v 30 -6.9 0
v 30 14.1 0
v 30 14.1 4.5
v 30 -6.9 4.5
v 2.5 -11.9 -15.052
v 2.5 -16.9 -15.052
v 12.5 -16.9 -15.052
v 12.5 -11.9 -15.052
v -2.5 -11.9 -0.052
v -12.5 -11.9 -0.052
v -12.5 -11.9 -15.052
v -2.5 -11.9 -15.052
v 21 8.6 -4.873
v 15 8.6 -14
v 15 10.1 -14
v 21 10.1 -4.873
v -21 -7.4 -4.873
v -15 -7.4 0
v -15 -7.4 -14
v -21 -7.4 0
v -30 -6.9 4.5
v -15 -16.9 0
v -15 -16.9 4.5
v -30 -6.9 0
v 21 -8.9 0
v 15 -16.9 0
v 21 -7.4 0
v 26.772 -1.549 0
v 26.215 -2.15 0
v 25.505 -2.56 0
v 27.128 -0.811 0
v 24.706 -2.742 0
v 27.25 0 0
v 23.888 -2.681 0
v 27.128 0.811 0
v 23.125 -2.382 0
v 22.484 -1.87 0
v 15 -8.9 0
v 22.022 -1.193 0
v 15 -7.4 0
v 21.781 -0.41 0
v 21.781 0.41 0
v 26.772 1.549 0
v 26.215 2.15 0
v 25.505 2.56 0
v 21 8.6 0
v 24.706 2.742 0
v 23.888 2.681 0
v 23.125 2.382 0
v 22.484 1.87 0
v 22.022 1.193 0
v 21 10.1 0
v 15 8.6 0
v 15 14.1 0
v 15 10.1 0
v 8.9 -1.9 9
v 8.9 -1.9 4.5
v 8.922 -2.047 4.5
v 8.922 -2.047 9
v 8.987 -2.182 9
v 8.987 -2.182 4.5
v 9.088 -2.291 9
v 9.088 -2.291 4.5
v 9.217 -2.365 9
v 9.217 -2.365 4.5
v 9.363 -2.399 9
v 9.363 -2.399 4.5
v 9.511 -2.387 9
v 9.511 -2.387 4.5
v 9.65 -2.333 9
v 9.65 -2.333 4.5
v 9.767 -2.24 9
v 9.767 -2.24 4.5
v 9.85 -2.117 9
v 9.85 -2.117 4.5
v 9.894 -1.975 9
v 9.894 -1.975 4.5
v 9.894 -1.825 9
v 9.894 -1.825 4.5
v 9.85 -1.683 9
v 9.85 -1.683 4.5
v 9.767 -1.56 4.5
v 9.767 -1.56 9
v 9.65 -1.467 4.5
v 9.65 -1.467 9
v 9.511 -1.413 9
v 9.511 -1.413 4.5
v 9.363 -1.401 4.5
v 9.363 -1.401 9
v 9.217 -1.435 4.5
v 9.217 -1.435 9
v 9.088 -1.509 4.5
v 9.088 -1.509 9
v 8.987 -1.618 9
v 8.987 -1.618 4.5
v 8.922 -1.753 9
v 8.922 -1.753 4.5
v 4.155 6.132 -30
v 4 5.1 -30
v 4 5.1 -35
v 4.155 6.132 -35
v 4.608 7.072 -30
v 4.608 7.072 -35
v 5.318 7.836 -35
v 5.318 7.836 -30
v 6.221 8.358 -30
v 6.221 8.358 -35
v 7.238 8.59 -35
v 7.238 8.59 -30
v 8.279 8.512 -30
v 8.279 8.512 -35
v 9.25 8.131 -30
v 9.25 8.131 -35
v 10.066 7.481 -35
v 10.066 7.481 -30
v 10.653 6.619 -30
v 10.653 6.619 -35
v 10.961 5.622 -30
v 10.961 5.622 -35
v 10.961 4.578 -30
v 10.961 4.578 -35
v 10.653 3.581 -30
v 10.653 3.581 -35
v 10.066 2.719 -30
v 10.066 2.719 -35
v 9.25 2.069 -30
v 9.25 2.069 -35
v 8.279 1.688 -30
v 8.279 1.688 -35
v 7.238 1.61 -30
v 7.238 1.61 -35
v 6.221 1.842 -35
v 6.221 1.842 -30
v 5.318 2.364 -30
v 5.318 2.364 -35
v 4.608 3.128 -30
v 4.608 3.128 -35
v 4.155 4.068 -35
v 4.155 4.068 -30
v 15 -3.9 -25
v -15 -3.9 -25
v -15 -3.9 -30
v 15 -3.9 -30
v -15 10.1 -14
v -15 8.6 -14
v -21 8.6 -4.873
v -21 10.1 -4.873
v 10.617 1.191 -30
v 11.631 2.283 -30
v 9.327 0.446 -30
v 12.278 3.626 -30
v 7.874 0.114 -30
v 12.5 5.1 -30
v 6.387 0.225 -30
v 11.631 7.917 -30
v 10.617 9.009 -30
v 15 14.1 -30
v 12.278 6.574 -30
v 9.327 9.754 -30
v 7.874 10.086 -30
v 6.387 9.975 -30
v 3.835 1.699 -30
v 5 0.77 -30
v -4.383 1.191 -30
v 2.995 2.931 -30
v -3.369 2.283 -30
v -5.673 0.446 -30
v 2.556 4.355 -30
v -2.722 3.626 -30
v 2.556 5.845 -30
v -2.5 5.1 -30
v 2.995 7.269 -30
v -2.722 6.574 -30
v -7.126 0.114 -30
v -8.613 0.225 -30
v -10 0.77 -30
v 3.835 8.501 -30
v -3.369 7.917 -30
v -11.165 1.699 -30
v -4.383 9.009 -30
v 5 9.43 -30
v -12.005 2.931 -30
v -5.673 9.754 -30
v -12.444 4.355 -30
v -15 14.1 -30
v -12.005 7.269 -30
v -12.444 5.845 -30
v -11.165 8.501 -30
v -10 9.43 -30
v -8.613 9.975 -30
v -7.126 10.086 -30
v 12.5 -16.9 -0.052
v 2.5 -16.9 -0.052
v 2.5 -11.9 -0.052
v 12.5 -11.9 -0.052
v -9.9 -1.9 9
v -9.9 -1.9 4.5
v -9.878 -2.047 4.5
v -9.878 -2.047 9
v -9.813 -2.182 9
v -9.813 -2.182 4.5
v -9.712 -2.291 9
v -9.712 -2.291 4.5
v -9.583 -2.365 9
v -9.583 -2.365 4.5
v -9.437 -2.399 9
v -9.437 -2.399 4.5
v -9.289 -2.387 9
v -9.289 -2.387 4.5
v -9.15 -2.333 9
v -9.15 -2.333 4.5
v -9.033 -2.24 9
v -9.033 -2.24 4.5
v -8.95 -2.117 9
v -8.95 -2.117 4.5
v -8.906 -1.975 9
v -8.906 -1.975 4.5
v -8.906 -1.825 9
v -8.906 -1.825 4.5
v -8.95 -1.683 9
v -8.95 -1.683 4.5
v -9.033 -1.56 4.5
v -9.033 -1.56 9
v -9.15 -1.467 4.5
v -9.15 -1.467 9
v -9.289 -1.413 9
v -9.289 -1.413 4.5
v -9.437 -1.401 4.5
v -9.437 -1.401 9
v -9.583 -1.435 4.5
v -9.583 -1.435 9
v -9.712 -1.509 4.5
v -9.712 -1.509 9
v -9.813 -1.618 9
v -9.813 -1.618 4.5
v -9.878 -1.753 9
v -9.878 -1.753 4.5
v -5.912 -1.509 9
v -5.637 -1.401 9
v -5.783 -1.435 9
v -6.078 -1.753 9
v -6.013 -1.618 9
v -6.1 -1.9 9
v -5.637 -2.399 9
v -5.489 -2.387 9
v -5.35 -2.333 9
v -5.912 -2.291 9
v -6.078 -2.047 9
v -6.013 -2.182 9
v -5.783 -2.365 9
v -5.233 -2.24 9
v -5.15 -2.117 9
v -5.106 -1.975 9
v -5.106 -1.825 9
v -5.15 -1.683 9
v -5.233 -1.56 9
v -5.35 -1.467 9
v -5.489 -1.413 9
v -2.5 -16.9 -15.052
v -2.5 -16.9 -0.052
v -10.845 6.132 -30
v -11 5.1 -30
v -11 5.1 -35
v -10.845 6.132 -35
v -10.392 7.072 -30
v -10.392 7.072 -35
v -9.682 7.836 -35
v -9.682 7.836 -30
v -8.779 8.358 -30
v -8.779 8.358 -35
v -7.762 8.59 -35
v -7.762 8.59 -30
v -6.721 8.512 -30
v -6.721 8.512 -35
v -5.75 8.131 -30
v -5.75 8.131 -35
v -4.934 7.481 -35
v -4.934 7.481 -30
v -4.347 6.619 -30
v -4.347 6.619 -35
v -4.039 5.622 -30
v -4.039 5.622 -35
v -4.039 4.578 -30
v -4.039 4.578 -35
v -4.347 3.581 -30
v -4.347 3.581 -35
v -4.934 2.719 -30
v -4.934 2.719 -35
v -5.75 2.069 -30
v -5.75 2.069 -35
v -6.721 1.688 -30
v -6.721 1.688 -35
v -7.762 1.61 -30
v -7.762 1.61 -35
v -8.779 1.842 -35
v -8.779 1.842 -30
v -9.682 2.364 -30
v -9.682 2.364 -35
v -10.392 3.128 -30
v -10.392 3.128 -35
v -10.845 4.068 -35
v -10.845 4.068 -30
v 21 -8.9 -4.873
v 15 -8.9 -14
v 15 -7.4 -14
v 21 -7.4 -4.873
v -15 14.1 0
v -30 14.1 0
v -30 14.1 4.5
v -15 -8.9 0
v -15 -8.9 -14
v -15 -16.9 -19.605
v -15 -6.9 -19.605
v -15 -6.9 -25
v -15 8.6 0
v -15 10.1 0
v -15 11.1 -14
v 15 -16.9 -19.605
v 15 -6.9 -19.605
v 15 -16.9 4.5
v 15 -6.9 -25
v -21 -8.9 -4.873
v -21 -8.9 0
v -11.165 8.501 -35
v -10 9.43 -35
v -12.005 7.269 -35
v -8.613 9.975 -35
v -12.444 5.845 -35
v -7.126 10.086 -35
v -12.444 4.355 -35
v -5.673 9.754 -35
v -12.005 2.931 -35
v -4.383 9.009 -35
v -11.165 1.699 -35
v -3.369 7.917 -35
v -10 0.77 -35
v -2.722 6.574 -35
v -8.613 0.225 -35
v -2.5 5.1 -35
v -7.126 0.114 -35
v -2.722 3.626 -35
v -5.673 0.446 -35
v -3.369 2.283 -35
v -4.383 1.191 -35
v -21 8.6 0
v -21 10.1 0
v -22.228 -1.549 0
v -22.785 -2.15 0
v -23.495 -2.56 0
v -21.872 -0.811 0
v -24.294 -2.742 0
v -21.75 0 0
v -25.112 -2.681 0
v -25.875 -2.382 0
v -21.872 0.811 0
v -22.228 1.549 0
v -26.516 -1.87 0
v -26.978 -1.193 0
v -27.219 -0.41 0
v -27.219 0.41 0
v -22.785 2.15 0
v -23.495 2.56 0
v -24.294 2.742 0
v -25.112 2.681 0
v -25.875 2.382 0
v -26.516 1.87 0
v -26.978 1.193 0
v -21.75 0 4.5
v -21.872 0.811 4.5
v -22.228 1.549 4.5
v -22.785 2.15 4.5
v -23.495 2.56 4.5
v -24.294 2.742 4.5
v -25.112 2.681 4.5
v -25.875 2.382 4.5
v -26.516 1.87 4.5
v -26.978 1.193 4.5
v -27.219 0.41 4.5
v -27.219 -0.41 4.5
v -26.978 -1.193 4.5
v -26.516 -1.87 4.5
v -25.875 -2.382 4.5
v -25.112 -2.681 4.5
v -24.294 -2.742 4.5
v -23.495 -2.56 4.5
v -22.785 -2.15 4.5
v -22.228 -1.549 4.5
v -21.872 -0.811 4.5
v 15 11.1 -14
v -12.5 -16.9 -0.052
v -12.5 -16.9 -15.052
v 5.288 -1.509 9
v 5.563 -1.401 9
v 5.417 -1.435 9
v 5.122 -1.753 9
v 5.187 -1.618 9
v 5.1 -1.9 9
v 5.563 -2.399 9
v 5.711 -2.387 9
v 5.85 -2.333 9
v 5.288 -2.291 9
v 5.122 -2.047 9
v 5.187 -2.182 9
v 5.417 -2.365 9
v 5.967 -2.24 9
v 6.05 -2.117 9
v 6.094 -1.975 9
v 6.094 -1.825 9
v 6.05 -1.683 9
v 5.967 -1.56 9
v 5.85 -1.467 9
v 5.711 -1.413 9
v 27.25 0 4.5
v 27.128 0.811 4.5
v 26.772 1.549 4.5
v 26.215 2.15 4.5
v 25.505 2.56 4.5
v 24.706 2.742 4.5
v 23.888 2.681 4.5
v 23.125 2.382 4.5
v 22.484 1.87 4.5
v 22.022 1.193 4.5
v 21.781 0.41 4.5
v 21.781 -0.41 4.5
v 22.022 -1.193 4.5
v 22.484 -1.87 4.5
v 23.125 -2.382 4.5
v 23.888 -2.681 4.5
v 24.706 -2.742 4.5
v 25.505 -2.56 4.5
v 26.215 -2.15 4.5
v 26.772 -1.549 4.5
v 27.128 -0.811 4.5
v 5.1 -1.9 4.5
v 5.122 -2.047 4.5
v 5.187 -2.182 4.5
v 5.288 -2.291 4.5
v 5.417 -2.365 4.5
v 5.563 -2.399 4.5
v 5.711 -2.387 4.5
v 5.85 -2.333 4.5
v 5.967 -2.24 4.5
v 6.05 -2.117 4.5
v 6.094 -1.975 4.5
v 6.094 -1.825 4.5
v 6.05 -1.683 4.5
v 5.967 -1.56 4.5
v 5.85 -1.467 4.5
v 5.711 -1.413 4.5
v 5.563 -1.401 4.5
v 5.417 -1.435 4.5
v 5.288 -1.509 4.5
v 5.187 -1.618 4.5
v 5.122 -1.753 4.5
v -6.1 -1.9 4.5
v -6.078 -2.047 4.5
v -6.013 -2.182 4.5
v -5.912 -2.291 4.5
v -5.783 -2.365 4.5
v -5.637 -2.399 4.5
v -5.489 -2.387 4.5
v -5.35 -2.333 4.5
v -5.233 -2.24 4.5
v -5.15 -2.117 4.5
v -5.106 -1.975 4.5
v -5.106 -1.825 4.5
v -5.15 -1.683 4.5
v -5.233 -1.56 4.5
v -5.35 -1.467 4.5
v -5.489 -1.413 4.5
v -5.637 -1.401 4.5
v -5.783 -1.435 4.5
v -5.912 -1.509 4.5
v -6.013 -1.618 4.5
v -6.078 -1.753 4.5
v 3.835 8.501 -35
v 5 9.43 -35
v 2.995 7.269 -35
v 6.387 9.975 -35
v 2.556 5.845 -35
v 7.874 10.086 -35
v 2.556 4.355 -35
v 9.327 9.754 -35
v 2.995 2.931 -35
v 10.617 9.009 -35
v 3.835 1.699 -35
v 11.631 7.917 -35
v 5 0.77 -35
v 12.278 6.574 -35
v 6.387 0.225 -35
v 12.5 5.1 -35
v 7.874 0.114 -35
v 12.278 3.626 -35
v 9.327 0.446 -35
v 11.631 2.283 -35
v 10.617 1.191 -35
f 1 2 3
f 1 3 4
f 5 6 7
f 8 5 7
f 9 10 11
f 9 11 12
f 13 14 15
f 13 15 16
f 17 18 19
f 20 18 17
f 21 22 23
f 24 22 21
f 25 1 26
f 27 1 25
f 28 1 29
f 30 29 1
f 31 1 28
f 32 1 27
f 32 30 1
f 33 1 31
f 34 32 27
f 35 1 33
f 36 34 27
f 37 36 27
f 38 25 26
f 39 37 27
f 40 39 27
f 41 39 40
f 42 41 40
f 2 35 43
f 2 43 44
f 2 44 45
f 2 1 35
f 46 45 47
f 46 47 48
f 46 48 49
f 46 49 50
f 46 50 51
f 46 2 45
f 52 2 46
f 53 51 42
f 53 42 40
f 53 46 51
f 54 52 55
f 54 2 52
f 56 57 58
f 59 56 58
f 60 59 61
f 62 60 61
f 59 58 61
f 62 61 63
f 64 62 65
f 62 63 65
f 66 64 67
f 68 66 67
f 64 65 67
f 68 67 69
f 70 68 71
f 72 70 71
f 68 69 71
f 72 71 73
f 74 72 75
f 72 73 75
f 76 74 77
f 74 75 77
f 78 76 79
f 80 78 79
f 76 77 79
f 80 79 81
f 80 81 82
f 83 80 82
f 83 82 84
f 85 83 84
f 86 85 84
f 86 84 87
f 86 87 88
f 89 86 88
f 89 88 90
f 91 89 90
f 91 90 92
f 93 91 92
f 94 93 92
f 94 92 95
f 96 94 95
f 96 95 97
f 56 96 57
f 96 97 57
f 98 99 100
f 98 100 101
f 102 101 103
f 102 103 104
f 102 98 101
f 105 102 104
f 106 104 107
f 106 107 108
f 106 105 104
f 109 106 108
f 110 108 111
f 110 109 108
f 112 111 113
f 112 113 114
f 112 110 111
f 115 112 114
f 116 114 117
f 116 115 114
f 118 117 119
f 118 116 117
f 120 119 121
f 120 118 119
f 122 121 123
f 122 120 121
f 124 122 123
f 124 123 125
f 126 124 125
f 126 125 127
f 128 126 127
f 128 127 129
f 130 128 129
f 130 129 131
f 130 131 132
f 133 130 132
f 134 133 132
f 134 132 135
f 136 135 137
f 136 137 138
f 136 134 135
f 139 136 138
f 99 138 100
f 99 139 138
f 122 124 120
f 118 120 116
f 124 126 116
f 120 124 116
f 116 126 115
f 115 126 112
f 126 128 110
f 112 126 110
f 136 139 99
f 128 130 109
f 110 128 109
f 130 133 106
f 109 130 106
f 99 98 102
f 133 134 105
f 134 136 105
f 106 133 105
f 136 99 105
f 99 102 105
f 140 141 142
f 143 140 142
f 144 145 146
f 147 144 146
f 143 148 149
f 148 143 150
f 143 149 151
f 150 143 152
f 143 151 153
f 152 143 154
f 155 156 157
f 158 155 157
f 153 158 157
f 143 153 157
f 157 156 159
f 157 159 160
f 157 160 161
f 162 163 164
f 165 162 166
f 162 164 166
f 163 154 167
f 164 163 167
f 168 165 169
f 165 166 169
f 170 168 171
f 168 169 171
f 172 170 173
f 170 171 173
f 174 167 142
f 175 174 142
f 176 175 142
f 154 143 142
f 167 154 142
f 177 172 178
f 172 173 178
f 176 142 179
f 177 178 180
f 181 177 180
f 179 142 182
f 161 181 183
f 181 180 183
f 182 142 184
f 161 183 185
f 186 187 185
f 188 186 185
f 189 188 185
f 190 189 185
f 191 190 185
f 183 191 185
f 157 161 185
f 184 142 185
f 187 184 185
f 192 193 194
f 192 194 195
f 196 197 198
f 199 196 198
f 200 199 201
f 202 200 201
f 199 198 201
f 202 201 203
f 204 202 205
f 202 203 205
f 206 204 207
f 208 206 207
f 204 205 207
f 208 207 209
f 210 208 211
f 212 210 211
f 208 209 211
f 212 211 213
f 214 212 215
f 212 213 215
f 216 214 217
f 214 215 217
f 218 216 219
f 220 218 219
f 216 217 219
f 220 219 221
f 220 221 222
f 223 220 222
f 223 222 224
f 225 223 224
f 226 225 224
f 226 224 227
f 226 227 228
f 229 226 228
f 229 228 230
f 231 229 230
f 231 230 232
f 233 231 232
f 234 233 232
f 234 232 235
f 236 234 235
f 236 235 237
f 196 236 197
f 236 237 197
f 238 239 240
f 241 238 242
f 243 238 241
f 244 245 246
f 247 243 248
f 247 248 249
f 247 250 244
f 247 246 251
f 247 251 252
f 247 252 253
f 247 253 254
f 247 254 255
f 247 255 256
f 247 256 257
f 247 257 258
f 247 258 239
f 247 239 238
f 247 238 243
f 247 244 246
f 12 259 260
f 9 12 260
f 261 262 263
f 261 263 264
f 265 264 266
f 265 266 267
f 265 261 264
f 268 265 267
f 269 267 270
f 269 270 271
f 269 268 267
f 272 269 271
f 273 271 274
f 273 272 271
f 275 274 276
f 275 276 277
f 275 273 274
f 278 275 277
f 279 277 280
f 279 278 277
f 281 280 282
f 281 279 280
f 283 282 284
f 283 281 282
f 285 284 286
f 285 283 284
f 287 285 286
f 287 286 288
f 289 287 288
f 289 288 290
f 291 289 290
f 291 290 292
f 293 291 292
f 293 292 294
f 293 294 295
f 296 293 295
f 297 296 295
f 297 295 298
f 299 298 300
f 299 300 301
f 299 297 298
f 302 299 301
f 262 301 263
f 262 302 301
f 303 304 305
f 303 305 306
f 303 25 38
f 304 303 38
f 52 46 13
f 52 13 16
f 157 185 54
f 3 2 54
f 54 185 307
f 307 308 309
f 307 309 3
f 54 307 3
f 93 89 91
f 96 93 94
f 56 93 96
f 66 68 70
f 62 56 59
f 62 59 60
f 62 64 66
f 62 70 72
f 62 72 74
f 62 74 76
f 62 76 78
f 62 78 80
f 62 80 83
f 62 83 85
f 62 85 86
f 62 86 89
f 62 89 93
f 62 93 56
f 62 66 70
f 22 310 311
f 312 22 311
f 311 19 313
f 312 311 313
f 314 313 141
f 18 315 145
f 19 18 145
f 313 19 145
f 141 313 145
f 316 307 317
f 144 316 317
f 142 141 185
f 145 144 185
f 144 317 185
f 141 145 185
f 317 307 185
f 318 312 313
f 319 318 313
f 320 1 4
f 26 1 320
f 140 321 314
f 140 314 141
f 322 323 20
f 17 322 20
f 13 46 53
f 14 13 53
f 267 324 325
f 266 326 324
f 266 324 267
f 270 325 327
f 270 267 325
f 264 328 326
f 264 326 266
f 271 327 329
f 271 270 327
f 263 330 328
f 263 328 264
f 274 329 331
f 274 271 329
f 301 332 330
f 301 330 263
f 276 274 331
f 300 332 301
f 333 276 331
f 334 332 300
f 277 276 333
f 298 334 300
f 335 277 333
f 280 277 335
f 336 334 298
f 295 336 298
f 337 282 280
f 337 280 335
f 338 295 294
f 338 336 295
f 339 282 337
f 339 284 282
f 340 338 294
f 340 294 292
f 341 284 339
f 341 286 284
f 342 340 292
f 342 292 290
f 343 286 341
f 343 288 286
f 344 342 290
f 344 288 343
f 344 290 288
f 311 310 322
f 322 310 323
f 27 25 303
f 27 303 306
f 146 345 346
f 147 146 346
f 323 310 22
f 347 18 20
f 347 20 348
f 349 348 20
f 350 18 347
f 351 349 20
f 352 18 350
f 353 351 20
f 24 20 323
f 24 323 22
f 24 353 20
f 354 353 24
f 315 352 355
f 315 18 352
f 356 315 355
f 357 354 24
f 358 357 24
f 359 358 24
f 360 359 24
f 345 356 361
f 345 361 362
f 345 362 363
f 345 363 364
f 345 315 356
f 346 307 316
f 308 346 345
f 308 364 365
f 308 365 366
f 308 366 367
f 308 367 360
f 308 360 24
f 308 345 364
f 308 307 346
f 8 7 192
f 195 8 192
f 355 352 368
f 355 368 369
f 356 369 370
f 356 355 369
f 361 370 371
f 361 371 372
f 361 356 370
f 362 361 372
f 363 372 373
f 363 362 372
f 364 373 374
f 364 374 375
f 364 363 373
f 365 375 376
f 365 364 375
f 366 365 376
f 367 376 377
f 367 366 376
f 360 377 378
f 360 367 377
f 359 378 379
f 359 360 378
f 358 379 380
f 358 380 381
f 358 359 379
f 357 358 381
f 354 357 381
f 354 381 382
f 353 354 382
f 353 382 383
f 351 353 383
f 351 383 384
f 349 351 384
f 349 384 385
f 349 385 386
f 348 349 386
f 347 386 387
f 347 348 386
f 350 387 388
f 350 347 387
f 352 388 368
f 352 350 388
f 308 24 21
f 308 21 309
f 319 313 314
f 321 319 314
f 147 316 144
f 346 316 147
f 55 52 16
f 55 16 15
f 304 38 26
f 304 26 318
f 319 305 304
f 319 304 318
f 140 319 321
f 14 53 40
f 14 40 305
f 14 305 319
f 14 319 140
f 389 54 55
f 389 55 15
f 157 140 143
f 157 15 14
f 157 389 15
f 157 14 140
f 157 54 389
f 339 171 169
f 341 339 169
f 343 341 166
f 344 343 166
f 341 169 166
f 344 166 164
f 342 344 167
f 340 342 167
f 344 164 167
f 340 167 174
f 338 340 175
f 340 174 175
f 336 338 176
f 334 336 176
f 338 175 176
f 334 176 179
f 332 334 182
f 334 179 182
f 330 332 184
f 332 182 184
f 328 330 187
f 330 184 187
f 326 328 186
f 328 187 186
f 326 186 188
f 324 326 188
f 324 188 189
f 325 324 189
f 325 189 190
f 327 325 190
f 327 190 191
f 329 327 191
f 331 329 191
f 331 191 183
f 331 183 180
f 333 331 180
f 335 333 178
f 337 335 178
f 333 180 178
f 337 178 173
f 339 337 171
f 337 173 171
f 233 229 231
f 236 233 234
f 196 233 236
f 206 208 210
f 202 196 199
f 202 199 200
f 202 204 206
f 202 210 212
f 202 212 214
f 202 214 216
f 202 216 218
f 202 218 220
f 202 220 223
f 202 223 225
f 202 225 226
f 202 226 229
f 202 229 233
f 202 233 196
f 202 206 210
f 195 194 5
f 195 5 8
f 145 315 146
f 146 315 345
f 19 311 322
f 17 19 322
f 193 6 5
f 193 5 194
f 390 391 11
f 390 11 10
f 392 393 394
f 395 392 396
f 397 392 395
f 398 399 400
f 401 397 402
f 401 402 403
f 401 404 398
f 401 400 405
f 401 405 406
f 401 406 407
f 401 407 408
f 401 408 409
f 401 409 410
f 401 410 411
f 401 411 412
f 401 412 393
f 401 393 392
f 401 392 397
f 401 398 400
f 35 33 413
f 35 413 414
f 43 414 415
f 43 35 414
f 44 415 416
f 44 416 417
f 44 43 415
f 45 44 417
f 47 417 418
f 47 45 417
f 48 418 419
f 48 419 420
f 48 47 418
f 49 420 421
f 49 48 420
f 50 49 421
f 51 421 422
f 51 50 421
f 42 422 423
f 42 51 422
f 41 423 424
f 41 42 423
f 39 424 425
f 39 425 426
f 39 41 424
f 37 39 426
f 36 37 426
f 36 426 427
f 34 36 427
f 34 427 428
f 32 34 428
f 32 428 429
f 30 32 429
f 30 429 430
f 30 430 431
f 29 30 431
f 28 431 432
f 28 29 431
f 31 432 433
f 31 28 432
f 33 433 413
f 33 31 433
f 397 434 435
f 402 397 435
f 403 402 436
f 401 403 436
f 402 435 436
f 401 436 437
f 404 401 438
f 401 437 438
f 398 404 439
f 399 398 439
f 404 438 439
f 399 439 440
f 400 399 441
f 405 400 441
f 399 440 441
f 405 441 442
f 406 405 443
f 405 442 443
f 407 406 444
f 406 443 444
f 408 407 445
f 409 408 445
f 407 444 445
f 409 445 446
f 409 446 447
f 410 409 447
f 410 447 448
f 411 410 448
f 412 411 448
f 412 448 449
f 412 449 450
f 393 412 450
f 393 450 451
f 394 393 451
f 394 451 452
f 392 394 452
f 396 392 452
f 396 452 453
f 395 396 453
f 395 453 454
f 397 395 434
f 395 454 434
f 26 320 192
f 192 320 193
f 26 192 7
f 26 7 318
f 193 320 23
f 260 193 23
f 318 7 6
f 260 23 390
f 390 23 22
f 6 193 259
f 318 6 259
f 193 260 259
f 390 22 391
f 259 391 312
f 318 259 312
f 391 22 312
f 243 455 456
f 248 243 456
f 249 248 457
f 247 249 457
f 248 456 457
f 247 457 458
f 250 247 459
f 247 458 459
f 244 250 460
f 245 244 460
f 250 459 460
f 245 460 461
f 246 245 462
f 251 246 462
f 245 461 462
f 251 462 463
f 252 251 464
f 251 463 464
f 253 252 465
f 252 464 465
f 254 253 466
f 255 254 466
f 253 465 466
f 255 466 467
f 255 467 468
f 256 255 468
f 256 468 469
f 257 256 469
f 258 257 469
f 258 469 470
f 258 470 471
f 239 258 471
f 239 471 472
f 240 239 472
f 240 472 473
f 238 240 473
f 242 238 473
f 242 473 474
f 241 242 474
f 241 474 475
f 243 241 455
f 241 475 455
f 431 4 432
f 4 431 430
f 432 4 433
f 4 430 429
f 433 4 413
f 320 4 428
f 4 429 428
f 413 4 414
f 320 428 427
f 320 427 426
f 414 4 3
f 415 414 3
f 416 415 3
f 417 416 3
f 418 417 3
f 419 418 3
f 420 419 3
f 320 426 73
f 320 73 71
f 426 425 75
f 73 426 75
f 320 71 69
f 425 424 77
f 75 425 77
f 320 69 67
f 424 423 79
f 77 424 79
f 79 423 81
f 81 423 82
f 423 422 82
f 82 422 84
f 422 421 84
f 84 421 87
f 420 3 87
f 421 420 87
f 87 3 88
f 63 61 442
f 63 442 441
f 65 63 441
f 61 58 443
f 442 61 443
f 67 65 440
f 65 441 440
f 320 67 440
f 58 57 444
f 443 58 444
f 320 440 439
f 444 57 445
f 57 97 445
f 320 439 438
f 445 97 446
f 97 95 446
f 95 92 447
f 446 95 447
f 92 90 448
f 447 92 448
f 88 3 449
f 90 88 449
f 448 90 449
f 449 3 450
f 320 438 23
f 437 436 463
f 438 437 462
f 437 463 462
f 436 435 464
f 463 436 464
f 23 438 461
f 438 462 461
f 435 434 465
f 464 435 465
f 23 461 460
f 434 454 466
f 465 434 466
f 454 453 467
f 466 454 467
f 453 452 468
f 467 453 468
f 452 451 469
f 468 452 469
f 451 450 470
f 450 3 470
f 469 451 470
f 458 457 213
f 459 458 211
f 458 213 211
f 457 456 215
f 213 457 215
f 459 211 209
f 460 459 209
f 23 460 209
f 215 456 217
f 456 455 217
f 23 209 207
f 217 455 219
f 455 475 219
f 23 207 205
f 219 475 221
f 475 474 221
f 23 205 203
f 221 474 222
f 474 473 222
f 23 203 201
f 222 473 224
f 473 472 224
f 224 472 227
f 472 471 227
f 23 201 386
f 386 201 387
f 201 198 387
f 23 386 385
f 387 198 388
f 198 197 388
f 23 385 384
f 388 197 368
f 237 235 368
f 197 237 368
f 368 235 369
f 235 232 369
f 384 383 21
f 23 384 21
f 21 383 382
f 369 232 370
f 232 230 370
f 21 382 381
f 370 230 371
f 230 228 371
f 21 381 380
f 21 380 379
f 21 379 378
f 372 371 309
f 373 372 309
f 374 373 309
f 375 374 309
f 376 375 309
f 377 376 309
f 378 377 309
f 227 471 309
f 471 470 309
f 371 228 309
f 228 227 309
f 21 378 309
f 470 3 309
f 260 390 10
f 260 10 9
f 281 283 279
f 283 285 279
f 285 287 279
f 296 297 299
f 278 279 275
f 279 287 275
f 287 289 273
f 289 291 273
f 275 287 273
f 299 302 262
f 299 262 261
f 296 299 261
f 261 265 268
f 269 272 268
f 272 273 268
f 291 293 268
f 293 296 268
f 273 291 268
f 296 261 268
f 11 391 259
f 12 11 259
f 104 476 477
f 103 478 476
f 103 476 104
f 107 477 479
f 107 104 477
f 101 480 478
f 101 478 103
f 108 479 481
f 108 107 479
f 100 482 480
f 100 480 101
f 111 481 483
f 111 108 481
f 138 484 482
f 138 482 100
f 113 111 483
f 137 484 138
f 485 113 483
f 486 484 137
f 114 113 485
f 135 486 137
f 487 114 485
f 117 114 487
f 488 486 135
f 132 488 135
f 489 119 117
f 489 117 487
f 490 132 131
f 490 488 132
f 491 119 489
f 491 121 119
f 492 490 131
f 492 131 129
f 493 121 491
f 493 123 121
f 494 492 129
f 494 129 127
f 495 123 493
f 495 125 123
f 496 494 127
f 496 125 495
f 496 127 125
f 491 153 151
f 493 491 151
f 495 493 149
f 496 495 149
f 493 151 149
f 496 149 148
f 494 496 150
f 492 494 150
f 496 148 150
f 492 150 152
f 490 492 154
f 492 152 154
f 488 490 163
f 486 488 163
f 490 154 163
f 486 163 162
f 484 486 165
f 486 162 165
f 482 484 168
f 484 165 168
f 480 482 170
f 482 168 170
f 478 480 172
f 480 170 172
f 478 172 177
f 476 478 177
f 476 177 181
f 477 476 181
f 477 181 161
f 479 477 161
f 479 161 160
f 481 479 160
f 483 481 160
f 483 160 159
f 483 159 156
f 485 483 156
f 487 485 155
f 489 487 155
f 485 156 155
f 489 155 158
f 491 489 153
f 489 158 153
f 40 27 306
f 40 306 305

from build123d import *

# Parameters (mm, degrees)
SKETCH_1_R           = 2.75
EXTRUDE_1_DEPTH      = 4.5
EXTRUDE_2_DEPTH      = 15
EXTRUDE_2_DEPTH_BACK = 15
SKETCH_3_R           = 5
SKETCH_3_R_2         = 3.5
EXTRUDE_3_DEPTH      = 5
SKETCH_4_W           = 10
SKETCH_4_H           = 15
CUT_EXTRUDE_1_DEPTH  = 5
SKETCH_5_R           = 0.5
EXTRUDE_4_DEPTH      = 4.5
SKETCH_6_W           = 6
SKETCH_6_H           = 1.5
EXTRUDE_5_DEPTH      = 14
CUT_EXTRUDE_2_DEPTH  = 20


with BuildPart() as part:
    # Эскиз1 → Вытянуть1 (new body)
    with BuildSketch(Plane.XY):
        Polygon((-15, -16.9), (-30, -6.9), (-30, 14.1), (30, 14.1), (30, -6.9), (15, -16.9), align=None)
        with Locations((-24.5, 0)):
            Circle(SKETCH_1_R, mode=Mode.SUBTRACT)
        with Locations((24.5, 0)):
            Circle(SKETCH_1_R, mode=Mode.SUBTRACT)
    extrude(amount=EXTRUDE_1_DEPTH)

    # Эскиз2 → Вытянуть2 (add, two sides: drawn at the far end of the back side and taken through both)
    with BuildSketch(Plane(origin=(0, 0, 0), x_dir=(0, 0, -1), z_dir=(1, 0, 0)).offset(-EXTRUDE_2_DEPTH_BACK)):
        Polygon((0, -16.9), (19.60451018, -16.9), (19.60451018, -6.9), (25, -6.9), (25, -3.9), (30, -3.9), (30, 14.1), (0, 14.1), align=None)
    extrude(amount=EXTRUDE_2_DEPTH + EXTRUDE_2_DEPTH_BACK)

    # Эскиз3 → Вытянуть3 (add)
    # profile 1 of 2: a face of its own
    with BuildSketch(Plane(origin=(0, 0, -30), x_dir=(-1, 0, 0), z_dir=(0, 0, -1))):
        with Locations(Location((-7.5, 5.1, 0), (0, 0, 180))):
            Circle(SKETCH_3_R)
        with Locations((-7.5, 5.1)):
            Circle(SKETCH_3_R_2, mode=Mode.SUBTRACT)
    # profile 2 of 2: a face of its own
    with BuildSketch(Plane(origin=(0, 0, -30), x_dir=(-1, 0, 0), z_dir=(0, 0, -1))):
        with Locations(Location((7.5, 5.1, 0), (0, 0, 180))):
            Circle(SKETCH_3_R)
        with Locations((7.5, 5.1)):
            Circle(SKETCH_3_R_2, mode=Mode.SUBTRACT)
    extrude(amount=EXTRUDE_3_DEPTH)

    # Эскиз4 → Вырез-Вытянуть1 (cut)
    with BuildSketch(Plane.XZ.offset(16.9)):
        with Locations((7.5, -7.55225509)):
            Rectangle(SKETCH_4_W, SKETCH_4_H)
        with Locations((-7.5, -7.55225509)):
            Rectangle(SKETCH_4_W, SKETCH_4_H)
    extrude(amount=-CUT_EXTRUDE_1_DEPTH, mode=Mode.SUBTRACT)

    # Эскиз5 → Вытянуть4 (add)
    with BuildSketch(Plane.XY.offset(4.5)):
        with Locations(Location((-9.4, -1.9, 0), (0, 0, 180))):
            Circle(SKETCH_5_R)
        with Locations(Location((-5.6, -1.9, 0), (0, 0, 180))):
            Circle(SKETCH_5_R)
        with Locations(Location((5.6, -1.9, 0), (0, 0, 180))):
            Circle(SKETCH_5_R)
        with Locations(Location((9.4, -1.9, 0), (0, 0, 180))):
            Circle(SKETCH_5_R)
    extrude(amount=EXTRUDE_4_DEPTH)

    # Эскиз6 → Вытянуть5 (add)
    with BuildSketch(Plane(origin=(0, 0, 0), x_dir=(-1, 0, 0), z_dir=(0, 0, -1))):
        with Locations((-18, -8.15)):
            Rectangle(SKETCH_6_W, SKETCH_6_H)
        with Locations((-18, 9.35)):
            Rectangle(SKETCH_6_W, SKETCH_6_H)
        with Locations((18, 9.35)):
            Rectangle(SKETCH_6_W, SKETCH_6_H)
        with Locations((18, -8.15)):
            Rectangle(SKETCH_6_W, SKETCH_6_H)
    extrude(amount=EXTRUDE_5_DEPTH)

    # Эскиз7 → Вырез-Вытянуть2 (cut)
    with BuildSketch(Plane.XZ.offset(8.9)):
        Polygon((15, -14), (22.174858564, -3.085279584), (22.174858564, -17.29993251), align=None)
        Polygon((-22.174858564, -17.29993251), (-15, -14), (-22.174858564, -3.085279584), align=None)
    extrude(amount=-CUT_EXTRUDE_2_DEPTH, mode=Mode.SUBTRACT)


solid = part.part
